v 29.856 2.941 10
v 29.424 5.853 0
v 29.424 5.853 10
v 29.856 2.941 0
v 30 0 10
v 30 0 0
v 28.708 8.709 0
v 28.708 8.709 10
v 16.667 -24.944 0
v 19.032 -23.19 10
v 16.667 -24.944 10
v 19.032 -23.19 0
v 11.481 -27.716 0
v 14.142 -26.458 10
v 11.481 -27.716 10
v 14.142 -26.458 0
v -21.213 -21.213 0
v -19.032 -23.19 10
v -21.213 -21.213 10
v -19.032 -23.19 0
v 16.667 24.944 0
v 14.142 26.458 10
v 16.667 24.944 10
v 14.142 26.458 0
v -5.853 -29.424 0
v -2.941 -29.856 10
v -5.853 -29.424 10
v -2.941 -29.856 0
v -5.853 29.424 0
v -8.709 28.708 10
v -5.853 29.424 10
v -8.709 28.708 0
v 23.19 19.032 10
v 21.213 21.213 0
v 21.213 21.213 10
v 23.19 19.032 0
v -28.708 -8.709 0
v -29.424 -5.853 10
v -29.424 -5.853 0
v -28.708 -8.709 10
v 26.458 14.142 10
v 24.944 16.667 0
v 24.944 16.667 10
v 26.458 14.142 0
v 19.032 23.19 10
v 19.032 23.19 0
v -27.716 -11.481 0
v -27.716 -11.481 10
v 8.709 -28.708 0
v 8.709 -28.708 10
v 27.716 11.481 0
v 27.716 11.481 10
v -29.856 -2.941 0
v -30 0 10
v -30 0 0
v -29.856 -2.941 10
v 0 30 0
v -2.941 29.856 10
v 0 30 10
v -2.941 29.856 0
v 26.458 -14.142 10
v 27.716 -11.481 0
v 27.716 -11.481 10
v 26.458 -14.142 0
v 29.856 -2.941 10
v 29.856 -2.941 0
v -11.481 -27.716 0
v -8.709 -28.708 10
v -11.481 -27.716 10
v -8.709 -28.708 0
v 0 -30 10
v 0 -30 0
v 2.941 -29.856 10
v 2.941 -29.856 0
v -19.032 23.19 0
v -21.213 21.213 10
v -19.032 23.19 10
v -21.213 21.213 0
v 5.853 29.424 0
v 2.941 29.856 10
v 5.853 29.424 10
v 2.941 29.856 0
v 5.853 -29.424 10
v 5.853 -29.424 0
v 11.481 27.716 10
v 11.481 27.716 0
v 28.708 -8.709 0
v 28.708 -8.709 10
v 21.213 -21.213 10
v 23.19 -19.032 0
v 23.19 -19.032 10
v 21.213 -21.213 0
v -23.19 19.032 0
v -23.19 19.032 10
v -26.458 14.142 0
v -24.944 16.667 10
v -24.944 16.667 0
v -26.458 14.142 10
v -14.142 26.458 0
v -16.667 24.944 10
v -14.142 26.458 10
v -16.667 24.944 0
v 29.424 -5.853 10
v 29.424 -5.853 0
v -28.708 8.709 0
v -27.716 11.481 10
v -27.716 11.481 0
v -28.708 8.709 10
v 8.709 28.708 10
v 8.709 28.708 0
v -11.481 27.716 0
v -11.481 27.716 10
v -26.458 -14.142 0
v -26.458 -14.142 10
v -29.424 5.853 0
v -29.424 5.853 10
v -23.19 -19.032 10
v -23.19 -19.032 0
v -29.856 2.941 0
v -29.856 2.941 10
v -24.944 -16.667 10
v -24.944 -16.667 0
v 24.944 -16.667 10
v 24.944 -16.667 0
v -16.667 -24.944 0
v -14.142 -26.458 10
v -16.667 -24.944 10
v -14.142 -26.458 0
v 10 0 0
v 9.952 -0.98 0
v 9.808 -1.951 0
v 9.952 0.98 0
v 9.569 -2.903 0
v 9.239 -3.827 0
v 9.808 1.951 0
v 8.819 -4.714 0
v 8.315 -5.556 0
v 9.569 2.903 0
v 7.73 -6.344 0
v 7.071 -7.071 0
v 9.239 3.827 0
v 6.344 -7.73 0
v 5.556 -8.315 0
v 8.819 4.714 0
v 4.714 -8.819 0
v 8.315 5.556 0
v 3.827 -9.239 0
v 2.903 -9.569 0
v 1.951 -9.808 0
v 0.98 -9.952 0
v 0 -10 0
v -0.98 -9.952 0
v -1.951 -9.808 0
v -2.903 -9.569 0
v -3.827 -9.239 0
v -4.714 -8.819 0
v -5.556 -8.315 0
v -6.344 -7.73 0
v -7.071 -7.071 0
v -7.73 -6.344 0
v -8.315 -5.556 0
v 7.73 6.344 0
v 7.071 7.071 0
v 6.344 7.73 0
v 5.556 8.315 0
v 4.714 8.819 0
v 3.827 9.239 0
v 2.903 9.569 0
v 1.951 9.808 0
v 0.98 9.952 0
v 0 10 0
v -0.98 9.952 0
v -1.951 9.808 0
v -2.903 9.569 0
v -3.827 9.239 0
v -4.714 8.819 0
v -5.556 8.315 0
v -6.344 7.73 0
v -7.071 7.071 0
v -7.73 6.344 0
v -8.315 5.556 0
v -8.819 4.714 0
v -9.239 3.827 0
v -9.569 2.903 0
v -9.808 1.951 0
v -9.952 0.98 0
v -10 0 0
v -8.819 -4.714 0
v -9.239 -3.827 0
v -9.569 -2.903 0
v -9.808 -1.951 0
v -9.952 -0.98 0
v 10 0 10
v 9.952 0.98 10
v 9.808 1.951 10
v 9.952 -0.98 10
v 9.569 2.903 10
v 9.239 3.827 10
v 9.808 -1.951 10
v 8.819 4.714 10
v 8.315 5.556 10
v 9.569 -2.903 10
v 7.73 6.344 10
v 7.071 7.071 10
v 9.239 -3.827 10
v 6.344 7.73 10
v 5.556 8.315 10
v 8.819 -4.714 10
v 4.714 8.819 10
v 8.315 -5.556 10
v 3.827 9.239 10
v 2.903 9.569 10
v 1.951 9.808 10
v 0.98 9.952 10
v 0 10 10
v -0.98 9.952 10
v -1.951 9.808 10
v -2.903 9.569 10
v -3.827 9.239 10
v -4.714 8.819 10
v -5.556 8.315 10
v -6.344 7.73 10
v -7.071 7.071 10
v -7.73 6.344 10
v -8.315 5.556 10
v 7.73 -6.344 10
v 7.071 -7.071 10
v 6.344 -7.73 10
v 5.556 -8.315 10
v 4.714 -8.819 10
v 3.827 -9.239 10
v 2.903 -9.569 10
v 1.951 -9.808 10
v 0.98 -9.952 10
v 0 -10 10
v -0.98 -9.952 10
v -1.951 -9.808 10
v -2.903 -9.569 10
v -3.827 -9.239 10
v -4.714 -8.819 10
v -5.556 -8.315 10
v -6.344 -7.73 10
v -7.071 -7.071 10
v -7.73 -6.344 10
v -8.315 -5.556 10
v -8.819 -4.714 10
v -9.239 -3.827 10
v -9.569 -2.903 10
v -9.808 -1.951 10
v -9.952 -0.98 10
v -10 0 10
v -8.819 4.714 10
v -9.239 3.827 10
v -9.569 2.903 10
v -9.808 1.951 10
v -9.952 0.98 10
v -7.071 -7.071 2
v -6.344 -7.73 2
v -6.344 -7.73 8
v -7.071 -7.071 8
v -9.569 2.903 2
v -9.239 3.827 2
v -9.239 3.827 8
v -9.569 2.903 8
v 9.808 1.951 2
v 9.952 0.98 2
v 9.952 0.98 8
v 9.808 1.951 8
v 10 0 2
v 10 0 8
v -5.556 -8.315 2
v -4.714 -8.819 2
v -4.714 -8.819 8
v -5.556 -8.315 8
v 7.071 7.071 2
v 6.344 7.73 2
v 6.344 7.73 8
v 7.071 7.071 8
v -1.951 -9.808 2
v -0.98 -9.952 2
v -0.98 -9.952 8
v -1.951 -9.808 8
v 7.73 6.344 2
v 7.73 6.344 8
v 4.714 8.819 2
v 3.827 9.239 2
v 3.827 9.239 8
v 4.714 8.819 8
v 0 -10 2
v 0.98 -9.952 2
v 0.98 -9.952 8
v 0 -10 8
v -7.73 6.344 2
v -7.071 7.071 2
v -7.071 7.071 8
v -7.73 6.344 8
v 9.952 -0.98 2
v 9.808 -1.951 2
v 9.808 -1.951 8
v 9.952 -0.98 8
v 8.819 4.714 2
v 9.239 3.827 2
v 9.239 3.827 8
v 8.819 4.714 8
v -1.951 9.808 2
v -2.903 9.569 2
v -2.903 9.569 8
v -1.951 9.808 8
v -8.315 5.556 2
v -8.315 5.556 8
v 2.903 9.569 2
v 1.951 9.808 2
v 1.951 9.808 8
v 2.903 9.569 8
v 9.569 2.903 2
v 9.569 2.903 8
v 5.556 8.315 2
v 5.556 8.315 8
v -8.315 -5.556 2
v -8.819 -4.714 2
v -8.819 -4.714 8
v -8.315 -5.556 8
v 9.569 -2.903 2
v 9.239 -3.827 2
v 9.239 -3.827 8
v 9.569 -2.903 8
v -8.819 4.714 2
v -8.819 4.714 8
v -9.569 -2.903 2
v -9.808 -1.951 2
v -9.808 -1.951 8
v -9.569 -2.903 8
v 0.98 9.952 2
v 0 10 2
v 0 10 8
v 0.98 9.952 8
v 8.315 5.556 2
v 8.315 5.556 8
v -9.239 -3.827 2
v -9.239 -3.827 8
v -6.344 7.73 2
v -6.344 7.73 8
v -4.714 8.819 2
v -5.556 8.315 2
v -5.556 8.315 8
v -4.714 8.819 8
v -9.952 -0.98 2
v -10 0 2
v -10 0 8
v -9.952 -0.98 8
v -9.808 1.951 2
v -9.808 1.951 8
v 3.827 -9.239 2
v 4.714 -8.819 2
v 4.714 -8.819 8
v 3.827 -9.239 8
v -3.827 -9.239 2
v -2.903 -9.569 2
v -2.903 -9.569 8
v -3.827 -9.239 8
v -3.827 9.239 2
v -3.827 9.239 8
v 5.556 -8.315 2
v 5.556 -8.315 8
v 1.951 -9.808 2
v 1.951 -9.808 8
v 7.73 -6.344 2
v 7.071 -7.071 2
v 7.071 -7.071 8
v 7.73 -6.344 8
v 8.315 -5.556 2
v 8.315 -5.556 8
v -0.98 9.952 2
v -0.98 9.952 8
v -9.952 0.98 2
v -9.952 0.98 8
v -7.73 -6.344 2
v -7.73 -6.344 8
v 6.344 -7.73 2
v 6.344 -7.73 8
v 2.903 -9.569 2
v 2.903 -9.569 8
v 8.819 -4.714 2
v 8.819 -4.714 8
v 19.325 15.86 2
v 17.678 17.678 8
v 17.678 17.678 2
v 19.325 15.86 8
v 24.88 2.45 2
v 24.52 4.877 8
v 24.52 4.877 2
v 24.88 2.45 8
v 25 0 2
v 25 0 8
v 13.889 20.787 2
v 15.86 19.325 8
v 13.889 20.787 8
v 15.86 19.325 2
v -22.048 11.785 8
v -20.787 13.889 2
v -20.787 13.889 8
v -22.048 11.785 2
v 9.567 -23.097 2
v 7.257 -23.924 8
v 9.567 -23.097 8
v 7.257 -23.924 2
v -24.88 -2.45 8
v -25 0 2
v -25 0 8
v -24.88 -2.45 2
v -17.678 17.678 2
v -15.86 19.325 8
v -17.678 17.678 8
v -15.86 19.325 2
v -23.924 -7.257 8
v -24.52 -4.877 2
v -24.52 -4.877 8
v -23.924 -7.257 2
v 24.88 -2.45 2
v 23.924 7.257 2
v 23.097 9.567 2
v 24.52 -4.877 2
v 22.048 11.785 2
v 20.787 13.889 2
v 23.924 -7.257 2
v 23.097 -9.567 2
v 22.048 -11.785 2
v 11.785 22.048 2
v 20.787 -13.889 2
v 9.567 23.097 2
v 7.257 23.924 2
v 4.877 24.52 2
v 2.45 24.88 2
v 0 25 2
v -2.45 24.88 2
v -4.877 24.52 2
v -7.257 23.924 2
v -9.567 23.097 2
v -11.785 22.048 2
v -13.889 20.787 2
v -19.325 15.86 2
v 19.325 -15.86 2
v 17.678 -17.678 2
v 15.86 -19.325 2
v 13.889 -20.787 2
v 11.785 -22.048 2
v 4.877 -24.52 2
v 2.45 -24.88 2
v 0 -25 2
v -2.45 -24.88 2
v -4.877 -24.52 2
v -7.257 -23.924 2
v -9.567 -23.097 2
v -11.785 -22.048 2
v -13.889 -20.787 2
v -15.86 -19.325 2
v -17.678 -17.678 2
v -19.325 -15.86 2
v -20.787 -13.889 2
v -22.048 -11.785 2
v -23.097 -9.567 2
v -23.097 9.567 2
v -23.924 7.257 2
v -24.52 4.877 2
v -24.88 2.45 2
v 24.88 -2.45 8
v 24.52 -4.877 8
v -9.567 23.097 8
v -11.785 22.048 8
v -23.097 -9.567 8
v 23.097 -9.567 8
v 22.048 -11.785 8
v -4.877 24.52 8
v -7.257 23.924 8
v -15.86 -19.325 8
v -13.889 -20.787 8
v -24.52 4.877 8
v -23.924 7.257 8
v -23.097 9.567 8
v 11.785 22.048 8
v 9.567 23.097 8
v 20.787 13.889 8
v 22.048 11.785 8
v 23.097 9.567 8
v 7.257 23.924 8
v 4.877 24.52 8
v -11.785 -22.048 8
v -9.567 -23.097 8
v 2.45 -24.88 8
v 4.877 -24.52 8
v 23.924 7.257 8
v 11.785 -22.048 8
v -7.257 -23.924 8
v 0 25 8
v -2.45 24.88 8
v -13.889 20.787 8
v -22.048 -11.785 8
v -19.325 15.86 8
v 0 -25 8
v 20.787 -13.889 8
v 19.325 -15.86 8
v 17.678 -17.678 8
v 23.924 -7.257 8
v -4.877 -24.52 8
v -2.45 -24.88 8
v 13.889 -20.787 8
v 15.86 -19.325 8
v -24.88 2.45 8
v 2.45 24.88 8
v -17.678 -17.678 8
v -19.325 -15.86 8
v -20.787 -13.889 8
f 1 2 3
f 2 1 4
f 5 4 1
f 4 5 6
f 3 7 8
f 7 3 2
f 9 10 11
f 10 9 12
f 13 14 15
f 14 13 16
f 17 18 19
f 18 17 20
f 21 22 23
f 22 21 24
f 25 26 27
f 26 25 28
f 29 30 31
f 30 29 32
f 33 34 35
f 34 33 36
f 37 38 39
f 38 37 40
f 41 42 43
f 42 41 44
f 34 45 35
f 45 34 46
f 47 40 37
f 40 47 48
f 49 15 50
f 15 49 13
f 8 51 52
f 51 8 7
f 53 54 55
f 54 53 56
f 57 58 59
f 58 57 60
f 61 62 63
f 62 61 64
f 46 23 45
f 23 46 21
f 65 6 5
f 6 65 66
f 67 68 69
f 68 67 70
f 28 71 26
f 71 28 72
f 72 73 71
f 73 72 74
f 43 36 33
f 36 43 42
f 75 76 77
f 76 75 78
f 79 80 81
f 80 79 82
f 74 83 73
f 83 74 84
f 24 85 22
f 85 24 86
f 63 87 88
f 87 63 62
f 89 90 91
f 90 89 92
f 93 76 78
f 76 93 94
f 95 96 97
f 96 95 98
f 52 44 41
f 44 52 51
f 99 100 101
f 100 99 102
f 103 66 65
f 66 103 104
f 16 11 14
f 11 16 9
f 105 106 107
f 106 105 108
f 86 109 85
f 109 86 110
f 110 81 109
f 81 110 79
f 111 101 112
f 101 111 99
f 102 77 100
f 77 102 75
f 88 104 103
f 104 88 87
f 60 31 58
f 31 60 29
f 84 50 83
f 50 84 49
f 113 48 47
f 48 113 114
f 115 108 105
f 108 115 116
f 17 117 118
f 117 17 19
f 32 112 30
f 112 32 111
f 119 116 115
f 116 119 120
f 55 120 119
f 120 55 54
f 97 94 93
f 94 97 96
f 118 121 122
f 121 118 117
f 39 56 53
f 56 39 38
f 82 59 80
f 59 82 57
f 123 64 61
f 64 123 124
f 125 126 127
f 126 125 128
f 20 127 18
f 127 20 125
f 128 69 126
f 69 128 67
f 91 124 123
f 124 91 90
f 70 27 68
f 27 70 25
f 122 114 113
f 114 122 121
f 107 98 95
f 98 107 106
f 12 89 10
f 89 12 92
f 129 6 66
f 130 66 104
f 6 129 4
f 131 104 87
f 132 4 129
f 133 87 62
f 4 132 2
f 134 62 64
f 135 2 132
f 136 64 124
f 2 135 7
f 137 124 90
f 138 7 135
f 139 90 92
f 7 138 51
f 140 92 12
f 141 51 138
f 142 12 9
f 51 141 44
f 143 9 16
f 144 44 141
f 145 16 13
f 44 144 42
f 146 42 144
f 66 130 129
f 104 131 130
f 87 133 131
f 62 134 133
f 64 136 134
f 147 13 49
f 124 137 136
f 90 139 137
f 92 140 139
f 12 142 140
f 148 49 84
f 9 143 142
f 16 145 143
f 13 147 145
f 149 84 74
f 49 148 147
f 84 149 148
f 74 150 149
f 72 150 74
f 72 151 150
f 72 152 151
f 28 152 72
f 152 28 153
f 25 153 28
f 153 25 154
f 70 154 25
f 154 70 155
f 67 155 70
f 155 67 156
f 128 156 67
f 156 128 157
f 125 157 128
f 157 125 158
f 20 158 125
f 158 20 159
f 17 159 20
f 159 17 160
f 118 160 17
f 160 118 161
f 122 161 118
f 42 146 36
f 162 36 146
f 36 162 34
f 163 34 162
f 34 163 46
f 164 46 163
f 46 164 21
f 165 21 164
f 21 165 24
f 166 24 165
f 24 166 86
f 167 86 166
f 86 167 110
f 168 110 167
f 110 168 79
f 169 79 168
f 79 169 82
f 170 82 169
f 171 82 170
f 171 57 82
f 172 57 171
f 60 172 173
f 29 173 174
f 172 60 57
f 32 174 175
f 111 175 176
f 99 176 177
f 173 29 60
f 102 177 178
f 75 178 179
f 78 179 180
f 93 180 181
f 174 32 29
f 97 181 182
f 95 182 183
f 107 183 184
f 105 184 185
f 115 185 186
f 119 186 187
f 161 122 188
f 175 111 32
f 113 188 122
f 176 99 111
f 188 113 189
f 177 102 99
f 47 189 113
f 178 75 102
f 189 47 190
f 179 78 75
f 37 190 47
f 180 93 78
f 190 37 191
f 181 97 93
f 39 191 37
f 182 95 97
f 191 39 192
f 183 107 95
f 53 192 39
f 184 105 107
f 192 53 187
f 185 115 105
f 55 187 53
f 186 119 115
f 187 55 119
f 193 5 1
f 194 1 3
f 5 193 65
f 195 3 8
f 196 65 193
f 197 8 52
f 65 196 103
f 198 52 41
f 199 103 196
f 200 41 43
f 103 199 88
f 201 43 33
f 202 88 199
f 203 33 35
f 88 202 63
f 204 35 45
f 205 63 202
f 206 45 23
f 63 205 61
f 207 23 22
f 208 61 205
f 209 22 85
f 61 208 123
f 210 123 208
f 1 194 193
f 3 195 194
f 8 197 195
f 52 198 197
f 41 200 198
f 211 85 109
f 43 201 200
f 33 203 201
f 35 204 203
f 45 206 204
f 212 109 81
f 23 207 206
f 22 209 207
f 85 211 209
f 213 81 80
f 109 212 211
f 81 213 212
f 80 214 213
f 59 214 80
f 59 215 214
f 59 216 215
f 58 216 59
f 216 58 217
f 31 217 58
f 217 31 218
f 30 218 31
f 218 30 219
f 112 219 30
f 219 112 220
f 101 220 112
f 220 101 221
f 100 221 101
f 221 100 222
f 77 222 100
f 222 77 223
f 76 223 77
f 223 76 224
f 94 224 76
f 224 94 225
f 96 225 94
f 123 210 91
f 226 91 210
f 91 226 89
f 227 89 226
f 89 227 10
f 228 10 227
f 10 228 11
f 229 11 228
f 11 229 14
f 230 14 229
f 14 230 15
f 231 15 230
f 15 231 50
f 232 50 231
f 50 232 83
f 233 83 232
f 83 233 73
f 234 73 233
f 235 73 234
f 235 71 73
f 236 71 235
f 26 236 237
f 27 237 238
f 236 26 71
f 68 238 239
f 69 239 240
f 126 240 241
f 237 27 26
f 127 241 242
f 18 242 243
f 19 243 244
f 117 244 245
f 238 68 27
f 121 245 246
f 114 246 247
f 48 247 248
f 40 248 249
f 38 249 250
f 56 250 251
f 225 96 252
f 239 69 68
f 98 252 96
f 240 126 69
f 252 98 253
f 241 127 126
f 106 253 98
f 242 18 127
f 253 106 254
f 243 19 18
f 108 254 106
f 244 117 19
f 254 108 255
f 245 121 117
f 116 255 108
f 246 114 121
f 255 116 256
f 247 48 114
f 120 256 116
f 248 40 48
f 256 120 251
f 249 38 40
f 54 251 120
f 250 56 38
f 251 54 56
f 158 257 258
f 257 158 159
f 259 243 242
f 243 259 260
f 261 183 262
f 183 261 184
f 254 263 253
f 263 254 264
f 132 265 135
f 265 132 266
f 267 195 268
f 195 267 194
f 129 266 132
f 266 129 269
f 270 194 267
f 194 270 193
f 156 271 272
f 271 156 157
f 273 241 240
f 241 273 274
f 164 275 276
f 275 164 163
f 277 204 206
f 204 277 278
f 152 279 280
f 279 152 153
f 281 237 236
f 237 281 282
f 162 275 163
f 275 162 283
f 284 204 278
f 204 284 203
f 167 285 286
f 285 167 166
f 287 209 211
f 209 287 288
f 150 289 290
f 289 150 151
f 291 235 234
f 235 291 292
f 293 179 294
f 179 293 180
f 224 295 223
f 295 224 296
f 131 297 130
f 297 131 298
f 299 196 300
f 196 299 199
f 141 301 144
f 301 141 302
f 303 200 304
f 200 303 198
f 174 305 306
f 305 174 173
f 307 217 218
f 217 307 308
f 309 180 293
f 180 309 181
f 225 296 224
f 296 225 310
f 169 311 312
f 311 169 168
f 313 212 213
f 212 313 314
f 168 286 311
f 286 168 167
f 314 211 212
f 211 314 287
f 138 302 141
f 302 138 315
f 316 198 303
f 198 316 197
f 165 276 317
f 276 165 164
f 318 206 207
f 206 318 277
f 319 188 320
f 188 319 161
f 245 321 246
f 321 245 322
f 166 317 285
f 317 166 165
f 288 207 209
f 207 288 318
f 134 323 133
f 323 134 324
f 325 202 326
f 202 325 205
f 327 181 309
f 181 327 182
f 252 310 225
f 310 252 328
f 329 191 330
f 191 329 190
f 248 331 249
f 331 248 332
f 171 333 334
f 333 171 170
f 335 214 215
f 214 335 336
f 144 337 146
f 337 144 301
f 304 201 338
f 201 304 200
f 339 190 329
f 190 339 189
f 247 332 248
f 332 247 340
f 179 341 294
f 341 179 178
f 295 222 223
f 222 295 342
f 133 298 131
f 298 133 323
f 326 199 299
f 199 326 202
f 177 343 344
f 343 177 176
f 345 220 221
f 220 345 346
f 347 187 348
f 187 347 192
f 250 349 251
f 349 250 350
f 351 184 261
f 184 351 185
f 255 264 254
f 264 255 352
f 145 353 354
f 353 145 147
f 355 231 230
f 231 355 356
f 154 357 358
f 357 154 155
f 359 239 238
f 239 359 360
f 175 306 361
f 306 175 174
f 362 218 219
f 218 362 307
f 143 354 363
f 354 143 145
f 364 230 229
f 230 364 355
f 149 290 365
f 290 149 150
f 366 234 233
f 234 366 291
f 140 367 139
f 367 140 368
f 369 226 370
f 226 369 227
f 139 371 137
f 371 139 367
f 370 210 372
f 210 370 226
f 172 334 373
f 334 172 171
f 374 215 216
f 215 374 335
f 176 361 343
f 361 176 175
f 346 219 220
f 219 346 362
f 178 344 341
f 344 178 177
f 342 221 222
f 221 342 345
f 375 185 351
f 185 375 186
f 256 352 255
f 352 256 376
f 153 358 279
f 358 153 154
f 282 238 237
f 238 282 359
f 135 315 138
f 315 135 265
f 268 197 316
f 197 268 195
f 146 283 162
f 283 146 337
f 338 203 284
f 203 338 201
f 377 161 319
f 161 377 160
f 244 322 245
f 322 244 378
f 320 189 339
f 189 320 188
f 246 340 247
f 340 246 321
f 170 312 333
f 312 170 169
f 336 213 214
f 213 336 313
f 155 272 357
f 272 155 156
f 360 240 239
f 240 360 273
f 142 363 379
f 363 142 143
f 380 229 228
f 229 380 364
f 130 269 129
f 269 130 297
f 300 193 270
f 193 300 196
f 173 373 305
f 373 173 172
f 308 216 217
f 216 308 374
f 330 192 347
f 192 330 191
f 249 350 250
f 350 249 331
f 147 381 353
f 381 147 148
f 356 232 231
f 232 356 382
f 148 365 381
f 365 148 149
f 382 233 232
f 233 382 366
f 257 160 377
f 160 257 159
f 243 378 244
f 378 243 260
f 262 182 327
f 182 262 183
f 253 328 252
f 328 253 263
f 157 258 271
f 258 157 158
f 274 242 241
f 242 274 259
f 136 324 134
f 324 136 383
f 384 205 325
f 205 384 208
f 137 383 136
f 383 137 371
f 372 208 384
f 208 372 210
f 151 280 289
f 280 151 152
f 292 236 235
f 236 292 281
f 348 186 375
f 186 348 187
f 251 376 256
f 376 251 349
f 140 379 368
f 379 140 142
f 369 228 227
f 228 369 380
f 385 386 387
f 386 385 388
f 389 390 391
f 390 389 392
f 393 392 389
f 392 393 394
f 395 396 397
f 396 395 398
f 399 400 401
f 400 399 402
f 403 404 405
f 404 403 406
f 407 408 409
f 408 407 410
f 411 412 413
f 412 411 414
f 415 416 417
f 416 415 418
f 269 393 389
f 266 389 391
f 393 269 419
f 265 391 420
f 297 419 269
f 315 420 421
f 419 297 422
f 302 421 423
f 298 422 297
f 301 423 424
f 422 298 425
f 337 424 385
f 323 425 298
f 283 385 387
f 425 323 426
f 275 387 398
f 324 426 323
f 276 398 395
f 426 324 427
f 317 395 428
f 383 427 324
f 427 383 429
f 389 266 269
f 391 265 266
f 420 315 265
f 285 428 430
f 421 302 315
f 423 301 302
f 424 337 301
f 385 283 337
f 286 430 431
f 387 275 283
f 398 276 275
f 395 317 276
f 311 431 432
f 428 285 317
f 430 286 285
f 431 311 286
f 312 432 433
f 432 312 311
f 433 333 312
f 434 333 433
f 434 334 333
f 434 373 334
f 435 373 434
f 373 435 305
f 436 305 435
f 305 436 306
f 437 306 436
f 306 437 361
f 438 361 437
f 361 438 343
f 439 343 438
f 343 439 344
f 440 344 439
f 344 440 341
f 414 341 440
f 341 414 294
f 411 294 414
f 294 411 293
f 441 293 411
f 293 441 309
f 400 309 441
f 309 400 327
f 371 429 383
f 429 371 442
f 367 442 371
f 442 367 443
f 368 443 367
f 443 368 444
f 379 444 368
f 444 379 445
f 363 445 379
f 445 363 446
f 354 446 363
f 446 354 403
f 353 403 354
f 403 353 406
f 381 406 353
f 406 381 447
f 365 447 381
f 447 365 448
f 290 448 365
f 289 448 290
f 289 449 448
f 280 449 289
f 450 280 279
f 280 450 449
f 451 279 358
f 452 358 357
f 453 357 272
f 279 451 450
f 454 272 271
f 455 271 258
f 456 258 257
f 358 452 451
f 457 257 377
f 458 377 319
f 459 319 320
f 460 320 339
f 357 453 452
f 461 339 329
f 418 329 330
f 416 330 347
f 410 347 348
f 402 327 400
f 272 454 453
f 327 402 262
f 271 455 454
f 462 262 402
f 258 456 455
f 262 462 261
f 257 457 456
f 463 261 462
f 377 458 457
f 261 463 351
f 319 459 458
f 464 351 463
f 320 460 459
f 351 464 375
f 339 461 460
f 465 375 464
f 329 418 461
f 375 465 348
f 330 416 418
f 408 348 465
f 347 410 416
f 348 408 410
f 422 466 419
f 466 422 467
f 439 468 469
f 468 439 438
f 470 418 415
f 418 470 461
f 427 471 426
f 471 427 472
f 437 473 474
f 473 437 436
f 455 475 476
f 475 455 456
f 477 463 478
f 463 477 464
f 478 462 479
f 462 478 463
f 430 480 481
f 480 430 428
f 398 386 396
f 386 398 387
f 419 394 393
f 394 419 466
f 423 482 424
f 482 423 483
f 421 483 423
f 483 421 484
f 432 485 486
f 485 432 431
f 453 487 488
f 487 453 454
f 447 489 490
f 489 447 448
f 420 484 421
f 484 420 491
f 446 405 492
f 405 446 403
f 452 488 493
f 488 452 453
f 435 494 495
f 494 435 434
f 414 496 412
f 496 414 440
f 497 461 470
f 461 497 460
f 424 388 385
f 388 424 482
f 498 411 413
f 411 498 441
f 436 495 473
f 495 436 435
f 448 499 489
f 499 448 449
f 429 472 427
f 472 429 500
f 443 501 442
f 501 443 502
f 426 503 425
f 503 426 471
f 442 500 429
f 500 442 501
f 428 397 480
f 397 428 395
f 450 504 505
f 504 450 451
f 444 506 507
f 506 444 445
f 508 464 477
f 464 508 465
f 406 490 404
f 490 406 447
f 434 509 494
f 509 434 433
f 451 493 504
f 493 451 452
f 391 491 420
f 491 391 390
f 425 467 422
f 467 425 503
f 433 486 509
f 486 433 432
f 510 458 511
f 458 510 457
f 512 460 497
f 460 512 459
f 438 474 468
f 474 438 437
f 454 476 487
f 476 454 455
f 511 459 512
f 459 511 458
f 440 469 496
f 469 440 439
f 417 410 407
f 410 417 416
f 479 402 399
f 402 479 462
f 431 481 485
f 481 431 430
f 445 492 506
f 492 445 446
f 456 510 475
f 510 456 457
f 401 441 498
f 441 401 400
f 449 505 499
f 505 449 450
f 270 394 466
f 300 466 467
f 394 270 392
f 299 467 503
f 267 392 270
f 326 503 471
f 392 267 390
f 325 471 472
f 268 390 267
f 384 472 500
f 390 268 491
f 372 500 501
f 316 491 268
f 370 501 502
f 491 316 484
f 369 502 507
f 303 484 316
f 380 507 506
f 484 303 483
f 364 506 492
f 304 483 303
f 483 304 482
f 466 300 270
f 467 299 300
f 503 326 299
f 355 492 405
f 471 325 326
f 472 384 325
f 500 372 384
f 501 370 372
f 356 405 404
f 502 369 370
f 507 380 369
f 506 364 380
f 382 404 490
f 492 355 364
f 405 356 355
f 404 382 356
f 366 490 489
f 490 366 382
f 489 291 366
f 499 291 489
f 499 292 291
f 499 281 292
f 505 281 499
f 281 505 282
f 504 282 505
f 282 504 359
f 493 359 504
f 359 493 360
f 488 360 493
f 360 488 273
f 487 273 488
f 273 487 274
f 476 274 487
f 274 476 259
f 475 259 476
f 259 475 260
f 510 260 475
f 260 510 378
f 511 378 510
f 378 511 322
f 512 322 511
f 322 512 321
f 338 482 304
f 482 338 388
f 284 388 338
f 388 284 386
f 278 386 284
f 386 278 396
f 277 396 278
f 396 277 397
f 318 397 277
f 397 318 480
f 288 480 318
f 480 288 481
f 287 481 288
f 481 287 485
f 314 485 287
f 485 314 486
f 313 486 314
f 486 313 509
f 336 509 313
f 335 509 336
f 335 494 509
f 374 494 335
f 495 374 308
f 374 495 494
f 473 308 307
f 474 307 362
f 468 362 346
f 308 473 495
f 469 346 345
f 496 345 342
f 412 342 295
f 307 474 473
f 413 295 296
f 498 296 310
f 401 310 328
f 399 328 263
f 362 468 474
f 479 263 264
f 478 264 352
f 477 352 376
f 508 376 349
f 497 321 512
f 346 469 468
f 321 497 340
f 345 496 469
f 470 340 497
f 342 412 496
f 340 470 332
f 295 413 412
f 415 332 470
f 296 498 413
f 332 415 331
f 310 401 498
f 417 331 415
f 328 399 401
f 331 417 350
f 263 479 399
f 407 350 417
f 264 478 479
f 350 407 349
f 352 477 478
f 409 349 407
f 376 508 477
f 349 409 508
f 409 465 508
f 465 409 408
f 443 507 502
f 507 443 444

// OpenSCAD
module pulley() {
    difference() {
        // Outer cylinder
        cylinder(h=10, r=30, $fn=64);
        
        // Inner cylinder (hole)
        translate([0, 0, -1])
            cylinder(h=12, r=10, $fn=64);
        
        // Groove
        translate([0, 0, 2])
            cylinder(h=6, r=25, $fn=64);
    }
}

pulley();
